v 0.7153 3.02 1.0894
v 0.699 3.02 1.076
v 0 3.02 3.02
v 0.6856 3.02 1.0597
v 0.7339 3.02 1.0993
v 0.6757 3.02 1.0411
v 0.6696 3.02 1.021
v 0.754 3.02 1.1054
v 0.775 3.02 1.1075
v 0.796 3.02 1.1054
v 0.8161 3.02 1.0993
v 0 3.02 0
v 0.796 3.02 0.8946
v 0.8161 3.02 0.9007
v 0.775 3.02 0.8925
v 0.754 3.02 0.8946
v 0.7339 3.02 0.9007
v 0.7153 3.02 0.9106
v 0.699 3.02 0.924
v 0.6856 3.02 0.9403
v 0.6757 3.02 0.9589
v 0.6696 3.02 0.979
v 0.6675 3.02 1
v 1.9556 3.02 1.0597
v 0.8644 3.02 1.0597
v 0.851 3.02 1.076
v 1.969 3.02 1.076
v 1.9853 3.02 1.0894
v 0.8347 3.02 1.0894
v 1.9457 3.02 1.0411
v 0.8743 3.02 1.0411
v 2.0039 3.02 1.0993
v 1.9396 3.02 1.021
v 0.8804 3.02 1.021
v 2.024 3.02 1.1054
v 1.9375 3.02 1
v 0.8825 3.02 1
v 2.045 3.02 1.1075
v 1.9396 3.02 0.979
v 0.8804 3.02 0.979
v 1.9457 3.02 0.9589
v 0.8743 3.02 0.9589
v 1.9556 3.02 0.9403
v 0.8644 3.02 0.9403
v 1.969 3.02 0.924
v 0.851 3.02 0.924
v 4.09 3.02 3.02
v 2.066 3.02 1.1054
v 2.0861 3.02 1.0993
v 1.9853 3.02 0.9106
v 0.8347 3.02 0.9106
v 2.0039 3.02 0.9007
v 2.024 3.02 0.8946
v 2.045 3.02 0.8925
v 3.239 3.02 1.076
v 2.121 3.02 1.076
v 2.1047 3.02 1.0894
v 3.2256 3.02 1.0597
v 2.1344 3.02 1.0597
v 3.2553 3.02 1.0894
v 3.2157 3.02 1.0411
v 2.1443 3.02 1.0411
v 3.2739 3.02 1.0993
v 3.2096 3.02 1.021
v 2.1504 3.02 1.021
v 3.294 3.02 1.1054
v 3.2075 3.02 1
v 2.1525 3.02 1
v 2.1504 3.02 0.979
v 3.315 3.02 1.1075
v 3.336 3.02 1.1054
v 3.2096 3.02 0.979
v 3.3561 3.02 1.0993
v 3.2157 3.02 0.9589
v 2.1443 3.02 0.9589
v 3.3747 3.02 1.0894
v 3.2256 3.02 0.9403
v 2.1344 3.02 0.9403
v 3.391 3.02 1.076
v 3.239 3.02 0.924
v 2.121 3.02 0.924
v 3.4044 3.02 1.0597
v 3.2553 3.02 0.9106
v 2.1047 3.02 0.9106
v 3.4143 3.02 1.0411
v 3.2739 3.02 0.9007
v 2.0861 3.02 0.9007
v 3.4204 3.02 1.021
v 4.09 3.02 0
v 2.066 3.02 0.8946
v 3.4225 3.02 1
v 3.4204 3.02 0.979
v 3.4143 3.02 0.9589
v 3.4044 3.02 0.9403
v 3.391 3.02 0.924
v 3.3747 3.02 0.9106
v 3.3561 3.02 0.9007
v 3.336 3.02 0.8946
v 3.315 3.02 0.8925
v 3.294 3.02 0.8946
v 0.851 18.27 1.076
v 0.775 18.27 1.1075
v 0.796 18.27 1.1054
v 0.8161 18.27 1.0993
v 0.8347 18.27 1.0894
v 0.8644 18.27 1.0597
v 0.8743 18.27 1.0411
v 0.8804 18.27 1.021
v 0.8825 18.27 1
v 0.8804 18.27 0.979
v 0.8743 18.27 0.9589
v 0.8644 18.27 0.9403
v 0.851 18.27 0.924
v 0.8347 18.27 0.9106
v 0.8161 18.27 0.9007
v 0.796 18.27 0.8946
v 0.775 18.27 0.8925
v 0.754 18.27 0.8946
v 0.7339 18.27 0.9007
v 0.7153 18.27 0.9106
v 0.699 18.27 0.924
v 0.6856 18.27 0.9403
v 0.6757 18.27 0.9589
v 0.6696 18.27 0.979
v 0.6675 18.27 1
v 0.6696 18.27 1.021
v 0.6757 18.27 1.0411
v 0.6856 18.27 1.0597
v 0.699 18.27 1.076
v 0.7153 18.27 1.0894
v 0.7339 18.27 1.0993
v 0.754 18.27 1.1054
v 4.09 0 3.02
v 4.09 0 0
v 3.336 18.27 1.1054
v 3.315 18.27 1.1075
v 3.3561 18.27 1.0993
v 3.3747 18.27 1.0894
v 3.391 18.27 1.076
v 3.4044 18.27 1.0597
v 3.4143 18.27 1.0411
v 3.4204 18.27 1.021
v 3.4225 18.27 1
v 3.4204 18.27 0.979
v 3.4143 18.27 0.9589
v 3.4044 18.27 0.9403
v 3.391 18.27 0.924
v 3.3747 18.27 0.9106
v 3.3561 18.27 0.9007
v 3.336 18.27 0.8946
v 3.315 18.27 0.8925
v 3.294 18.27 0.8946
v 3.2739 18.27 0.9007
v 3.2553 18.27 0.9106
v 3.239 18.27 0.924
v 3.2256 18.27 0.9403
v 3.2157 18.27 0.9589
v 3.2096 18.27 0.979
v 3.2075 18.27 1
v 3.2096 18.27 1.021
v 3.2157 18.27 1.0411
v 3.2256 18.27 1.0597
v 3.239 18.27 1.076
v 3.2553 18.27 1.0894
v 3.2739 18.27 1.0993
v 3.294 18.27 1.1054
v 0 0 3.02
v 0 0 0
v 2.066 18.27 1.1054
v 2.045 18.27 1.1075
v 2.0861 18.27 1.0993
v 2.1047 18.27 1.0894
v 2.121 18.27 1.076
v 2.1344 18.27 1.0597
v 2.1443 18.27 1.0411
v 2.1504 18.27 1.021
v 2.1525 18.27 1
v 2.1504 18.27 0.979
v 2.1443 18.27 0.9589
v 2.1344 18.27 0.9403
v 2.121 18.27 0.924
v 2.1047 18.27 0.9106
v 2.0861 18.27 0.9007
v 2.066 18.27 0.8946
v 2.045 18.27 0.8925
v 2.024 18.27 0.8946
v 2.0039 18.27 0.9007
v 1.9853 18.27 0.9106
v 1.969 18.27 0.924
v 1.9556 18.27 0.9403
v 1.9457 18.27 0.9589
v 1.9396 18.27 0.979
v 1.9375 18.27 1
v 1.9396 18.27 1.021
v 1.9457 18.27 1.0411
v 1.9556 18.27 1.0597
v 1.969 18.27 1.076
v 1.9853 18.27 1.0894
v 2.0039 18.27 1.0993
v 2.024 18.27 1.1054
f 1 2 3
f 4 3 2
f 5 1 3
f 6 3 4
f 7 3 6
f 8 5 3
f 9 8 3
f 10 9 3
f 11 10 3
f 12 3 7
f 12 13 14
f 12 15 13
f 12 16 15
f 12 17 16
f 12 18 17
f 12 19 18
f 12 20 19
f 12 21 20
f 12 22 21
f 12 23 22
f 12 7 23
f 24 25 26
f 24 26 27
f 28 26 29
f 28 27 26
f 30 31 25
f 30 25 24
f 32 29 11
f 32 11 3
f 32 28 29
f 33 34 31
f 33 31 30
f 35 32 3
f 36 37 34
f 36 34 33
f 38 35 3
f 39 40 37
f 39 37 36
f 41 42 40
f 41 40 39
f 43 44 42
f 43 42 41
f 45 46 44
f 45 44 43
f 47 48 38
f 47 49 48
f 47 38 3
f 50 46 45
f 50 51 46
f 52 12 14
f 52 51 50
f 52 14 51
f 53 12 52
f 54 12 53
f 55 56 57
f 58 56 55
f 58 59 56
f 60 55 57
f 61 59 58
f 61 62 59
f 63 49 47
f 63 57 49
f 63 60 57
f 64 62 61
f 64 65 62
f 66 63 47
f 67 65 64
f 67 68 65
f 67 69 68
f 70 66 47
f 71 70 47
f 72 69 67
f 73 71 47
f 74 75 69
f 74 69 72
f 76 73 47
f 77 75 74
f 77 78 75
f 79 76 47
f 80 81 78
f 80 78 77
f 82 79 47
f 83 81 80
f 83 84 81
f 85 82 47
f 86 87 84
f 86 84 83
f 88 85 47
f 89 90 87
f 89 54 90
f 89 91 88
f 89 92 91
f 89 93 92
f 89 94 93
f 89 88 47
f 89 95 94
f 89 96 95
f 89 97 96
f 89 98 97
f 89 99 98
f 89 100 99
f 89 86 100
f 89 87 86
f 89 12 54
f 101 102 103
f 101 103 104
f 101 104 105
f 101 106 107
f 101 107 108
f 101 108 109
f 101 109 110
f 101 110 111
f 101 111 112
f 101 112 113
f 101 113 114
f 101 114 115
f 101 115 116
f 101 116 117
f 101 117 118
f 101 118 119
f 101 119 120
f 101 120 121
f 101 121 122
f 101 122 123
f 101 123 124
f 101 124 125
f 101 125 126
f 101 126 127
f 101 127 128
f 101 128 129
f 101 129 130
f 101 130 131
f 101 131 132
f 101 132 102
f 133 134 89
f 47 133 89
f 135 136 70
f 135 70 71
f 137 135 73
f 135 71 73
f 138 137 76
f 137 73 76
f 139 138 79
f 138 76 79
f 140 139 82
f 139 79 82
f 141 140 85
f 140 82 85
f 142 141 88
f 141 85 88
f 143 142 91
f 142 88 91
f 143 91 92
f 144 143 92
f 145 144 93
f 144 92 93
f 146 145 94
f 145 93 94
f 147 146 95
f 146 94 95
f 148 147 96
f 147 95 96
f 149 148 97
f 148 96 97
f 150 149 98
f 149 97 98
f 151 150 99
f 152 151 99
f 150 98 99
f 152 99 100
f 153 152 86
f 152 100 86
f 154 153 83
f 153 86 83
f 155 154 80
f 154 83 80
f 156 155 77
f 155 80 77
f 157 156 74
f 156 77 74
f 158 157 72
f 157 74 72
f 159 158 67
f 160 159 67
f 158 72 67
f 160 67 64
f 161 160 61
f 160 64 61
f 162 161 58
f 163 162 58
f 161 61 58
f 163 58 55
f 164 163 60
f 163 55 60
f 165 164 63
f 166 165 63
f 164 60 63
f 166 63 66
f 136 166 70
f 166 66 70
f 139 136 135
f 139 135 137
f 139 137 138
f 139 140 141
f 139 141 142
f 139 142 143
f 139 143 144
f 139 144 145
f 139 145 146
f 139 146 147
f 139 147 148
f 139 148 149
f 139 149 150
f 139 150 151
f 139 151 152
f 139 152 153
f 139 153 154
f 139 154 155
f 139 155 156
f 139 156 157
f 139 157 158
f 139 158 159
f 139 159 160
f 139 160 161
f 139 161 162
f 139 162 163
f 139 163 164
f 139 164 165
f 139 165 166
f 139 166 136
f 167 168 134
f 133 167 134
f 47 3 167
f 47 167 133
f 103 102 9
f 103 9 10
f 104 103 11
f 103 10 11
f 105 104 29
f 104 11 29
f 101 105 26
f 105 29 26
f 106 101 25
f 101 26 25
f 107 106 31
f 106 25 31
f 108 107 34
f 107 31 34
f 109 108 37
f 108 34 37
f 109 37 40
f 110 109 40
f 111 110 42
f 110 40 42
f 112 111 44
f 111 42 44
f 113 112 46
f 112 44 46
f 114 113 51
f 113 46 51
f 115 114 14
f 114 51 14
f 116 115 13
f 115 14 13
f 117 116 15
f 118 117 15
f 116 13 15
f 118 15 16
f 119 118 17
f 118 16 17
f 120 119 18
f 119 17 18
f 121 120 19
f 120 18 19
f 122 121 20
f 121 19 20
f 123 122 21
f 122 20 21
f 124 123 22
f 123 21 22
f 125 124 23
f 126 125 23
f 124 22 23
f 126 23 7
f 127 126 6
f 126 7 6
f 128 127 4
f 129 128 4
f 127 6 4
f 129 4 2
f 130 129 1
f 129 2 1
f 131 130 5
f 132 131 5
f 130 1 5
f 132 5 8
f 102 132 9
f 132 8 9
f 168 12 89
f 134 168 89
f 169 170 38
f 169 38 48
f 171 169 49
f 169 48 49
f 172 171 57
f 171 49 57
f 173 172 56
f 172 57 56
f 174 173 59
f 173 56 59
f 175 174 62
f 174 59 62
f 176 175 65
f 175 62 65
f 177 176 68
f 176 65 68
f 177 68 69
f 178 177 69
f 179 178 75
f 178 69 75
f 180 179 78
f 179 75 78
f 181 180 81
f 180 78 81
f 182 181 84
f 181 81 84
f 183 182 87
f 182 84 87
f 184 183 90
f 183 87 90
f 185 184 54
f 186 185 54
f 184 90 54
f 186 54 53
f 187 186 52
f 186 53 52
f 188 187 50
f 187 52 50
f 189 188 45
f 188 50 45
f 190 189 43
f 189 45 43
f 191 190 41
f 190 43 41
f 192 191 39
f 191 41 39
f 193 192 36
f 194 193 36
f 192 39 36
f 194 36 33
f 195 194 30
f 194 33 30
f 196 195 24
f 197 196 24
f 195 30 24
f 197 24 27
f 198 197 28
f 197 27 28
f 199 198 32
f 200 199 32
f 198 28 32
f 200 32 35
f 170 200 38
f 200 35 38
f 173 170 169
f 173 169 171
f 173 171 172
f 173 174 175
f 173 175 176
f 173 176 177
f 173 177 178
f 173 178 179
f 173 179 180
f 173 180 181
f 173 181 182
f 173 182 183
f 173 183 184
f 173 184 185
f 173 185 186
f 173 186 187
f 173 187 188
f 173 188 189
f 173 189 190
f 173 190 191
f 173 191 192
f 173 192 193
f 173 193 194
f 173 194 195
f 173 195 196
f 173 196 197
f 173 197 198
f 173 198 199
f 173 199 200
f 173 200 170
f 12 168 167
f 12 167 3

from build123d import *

# Parameters (mm, degrees)
SKETCH1_W           = 4.09
SKETCH1_H           = 3.02
BOSS_EXTRUDE1_DEPTH = 3.02
SKETCH2_R           = 0.1075
BOSS_EXTRUDE2_DEPTH = 15.25


with BuildPart() as part:
    # Sketch1 → Boss-Extrude1 (new body)
    with BuildSketch(Plane.XY):
        with Locations((2.045, 1.51)):
            Rectangle(SKETCH1_W, SKETCH1_H)
    extrude(amount=BOSS_EXTRUDE1_DEPTH)

    # Sketch2 → Boss-Extrude2 (add)
    with BuildSketch(Plane(origin=(0, 3.02, 0), x_dir=(1, 0, 0), z_dir=(0, 1, 0))):
        with Locations(Location((0.775, -1, 0), (0, 0, 270))):
            Circle(SKETCH2_R)
        with Locations(Location((2.045, -1, 0), (0, 0, 270))):
            Circle(SKETCH2_R)
        with Locations(Location((3.315, -1, 0), (0, 0, 270))):
            Circle(SKETCH2_R)
    extrude(amount=BOSS_EXTRUDE2_DEPTH)


solid = part.part
